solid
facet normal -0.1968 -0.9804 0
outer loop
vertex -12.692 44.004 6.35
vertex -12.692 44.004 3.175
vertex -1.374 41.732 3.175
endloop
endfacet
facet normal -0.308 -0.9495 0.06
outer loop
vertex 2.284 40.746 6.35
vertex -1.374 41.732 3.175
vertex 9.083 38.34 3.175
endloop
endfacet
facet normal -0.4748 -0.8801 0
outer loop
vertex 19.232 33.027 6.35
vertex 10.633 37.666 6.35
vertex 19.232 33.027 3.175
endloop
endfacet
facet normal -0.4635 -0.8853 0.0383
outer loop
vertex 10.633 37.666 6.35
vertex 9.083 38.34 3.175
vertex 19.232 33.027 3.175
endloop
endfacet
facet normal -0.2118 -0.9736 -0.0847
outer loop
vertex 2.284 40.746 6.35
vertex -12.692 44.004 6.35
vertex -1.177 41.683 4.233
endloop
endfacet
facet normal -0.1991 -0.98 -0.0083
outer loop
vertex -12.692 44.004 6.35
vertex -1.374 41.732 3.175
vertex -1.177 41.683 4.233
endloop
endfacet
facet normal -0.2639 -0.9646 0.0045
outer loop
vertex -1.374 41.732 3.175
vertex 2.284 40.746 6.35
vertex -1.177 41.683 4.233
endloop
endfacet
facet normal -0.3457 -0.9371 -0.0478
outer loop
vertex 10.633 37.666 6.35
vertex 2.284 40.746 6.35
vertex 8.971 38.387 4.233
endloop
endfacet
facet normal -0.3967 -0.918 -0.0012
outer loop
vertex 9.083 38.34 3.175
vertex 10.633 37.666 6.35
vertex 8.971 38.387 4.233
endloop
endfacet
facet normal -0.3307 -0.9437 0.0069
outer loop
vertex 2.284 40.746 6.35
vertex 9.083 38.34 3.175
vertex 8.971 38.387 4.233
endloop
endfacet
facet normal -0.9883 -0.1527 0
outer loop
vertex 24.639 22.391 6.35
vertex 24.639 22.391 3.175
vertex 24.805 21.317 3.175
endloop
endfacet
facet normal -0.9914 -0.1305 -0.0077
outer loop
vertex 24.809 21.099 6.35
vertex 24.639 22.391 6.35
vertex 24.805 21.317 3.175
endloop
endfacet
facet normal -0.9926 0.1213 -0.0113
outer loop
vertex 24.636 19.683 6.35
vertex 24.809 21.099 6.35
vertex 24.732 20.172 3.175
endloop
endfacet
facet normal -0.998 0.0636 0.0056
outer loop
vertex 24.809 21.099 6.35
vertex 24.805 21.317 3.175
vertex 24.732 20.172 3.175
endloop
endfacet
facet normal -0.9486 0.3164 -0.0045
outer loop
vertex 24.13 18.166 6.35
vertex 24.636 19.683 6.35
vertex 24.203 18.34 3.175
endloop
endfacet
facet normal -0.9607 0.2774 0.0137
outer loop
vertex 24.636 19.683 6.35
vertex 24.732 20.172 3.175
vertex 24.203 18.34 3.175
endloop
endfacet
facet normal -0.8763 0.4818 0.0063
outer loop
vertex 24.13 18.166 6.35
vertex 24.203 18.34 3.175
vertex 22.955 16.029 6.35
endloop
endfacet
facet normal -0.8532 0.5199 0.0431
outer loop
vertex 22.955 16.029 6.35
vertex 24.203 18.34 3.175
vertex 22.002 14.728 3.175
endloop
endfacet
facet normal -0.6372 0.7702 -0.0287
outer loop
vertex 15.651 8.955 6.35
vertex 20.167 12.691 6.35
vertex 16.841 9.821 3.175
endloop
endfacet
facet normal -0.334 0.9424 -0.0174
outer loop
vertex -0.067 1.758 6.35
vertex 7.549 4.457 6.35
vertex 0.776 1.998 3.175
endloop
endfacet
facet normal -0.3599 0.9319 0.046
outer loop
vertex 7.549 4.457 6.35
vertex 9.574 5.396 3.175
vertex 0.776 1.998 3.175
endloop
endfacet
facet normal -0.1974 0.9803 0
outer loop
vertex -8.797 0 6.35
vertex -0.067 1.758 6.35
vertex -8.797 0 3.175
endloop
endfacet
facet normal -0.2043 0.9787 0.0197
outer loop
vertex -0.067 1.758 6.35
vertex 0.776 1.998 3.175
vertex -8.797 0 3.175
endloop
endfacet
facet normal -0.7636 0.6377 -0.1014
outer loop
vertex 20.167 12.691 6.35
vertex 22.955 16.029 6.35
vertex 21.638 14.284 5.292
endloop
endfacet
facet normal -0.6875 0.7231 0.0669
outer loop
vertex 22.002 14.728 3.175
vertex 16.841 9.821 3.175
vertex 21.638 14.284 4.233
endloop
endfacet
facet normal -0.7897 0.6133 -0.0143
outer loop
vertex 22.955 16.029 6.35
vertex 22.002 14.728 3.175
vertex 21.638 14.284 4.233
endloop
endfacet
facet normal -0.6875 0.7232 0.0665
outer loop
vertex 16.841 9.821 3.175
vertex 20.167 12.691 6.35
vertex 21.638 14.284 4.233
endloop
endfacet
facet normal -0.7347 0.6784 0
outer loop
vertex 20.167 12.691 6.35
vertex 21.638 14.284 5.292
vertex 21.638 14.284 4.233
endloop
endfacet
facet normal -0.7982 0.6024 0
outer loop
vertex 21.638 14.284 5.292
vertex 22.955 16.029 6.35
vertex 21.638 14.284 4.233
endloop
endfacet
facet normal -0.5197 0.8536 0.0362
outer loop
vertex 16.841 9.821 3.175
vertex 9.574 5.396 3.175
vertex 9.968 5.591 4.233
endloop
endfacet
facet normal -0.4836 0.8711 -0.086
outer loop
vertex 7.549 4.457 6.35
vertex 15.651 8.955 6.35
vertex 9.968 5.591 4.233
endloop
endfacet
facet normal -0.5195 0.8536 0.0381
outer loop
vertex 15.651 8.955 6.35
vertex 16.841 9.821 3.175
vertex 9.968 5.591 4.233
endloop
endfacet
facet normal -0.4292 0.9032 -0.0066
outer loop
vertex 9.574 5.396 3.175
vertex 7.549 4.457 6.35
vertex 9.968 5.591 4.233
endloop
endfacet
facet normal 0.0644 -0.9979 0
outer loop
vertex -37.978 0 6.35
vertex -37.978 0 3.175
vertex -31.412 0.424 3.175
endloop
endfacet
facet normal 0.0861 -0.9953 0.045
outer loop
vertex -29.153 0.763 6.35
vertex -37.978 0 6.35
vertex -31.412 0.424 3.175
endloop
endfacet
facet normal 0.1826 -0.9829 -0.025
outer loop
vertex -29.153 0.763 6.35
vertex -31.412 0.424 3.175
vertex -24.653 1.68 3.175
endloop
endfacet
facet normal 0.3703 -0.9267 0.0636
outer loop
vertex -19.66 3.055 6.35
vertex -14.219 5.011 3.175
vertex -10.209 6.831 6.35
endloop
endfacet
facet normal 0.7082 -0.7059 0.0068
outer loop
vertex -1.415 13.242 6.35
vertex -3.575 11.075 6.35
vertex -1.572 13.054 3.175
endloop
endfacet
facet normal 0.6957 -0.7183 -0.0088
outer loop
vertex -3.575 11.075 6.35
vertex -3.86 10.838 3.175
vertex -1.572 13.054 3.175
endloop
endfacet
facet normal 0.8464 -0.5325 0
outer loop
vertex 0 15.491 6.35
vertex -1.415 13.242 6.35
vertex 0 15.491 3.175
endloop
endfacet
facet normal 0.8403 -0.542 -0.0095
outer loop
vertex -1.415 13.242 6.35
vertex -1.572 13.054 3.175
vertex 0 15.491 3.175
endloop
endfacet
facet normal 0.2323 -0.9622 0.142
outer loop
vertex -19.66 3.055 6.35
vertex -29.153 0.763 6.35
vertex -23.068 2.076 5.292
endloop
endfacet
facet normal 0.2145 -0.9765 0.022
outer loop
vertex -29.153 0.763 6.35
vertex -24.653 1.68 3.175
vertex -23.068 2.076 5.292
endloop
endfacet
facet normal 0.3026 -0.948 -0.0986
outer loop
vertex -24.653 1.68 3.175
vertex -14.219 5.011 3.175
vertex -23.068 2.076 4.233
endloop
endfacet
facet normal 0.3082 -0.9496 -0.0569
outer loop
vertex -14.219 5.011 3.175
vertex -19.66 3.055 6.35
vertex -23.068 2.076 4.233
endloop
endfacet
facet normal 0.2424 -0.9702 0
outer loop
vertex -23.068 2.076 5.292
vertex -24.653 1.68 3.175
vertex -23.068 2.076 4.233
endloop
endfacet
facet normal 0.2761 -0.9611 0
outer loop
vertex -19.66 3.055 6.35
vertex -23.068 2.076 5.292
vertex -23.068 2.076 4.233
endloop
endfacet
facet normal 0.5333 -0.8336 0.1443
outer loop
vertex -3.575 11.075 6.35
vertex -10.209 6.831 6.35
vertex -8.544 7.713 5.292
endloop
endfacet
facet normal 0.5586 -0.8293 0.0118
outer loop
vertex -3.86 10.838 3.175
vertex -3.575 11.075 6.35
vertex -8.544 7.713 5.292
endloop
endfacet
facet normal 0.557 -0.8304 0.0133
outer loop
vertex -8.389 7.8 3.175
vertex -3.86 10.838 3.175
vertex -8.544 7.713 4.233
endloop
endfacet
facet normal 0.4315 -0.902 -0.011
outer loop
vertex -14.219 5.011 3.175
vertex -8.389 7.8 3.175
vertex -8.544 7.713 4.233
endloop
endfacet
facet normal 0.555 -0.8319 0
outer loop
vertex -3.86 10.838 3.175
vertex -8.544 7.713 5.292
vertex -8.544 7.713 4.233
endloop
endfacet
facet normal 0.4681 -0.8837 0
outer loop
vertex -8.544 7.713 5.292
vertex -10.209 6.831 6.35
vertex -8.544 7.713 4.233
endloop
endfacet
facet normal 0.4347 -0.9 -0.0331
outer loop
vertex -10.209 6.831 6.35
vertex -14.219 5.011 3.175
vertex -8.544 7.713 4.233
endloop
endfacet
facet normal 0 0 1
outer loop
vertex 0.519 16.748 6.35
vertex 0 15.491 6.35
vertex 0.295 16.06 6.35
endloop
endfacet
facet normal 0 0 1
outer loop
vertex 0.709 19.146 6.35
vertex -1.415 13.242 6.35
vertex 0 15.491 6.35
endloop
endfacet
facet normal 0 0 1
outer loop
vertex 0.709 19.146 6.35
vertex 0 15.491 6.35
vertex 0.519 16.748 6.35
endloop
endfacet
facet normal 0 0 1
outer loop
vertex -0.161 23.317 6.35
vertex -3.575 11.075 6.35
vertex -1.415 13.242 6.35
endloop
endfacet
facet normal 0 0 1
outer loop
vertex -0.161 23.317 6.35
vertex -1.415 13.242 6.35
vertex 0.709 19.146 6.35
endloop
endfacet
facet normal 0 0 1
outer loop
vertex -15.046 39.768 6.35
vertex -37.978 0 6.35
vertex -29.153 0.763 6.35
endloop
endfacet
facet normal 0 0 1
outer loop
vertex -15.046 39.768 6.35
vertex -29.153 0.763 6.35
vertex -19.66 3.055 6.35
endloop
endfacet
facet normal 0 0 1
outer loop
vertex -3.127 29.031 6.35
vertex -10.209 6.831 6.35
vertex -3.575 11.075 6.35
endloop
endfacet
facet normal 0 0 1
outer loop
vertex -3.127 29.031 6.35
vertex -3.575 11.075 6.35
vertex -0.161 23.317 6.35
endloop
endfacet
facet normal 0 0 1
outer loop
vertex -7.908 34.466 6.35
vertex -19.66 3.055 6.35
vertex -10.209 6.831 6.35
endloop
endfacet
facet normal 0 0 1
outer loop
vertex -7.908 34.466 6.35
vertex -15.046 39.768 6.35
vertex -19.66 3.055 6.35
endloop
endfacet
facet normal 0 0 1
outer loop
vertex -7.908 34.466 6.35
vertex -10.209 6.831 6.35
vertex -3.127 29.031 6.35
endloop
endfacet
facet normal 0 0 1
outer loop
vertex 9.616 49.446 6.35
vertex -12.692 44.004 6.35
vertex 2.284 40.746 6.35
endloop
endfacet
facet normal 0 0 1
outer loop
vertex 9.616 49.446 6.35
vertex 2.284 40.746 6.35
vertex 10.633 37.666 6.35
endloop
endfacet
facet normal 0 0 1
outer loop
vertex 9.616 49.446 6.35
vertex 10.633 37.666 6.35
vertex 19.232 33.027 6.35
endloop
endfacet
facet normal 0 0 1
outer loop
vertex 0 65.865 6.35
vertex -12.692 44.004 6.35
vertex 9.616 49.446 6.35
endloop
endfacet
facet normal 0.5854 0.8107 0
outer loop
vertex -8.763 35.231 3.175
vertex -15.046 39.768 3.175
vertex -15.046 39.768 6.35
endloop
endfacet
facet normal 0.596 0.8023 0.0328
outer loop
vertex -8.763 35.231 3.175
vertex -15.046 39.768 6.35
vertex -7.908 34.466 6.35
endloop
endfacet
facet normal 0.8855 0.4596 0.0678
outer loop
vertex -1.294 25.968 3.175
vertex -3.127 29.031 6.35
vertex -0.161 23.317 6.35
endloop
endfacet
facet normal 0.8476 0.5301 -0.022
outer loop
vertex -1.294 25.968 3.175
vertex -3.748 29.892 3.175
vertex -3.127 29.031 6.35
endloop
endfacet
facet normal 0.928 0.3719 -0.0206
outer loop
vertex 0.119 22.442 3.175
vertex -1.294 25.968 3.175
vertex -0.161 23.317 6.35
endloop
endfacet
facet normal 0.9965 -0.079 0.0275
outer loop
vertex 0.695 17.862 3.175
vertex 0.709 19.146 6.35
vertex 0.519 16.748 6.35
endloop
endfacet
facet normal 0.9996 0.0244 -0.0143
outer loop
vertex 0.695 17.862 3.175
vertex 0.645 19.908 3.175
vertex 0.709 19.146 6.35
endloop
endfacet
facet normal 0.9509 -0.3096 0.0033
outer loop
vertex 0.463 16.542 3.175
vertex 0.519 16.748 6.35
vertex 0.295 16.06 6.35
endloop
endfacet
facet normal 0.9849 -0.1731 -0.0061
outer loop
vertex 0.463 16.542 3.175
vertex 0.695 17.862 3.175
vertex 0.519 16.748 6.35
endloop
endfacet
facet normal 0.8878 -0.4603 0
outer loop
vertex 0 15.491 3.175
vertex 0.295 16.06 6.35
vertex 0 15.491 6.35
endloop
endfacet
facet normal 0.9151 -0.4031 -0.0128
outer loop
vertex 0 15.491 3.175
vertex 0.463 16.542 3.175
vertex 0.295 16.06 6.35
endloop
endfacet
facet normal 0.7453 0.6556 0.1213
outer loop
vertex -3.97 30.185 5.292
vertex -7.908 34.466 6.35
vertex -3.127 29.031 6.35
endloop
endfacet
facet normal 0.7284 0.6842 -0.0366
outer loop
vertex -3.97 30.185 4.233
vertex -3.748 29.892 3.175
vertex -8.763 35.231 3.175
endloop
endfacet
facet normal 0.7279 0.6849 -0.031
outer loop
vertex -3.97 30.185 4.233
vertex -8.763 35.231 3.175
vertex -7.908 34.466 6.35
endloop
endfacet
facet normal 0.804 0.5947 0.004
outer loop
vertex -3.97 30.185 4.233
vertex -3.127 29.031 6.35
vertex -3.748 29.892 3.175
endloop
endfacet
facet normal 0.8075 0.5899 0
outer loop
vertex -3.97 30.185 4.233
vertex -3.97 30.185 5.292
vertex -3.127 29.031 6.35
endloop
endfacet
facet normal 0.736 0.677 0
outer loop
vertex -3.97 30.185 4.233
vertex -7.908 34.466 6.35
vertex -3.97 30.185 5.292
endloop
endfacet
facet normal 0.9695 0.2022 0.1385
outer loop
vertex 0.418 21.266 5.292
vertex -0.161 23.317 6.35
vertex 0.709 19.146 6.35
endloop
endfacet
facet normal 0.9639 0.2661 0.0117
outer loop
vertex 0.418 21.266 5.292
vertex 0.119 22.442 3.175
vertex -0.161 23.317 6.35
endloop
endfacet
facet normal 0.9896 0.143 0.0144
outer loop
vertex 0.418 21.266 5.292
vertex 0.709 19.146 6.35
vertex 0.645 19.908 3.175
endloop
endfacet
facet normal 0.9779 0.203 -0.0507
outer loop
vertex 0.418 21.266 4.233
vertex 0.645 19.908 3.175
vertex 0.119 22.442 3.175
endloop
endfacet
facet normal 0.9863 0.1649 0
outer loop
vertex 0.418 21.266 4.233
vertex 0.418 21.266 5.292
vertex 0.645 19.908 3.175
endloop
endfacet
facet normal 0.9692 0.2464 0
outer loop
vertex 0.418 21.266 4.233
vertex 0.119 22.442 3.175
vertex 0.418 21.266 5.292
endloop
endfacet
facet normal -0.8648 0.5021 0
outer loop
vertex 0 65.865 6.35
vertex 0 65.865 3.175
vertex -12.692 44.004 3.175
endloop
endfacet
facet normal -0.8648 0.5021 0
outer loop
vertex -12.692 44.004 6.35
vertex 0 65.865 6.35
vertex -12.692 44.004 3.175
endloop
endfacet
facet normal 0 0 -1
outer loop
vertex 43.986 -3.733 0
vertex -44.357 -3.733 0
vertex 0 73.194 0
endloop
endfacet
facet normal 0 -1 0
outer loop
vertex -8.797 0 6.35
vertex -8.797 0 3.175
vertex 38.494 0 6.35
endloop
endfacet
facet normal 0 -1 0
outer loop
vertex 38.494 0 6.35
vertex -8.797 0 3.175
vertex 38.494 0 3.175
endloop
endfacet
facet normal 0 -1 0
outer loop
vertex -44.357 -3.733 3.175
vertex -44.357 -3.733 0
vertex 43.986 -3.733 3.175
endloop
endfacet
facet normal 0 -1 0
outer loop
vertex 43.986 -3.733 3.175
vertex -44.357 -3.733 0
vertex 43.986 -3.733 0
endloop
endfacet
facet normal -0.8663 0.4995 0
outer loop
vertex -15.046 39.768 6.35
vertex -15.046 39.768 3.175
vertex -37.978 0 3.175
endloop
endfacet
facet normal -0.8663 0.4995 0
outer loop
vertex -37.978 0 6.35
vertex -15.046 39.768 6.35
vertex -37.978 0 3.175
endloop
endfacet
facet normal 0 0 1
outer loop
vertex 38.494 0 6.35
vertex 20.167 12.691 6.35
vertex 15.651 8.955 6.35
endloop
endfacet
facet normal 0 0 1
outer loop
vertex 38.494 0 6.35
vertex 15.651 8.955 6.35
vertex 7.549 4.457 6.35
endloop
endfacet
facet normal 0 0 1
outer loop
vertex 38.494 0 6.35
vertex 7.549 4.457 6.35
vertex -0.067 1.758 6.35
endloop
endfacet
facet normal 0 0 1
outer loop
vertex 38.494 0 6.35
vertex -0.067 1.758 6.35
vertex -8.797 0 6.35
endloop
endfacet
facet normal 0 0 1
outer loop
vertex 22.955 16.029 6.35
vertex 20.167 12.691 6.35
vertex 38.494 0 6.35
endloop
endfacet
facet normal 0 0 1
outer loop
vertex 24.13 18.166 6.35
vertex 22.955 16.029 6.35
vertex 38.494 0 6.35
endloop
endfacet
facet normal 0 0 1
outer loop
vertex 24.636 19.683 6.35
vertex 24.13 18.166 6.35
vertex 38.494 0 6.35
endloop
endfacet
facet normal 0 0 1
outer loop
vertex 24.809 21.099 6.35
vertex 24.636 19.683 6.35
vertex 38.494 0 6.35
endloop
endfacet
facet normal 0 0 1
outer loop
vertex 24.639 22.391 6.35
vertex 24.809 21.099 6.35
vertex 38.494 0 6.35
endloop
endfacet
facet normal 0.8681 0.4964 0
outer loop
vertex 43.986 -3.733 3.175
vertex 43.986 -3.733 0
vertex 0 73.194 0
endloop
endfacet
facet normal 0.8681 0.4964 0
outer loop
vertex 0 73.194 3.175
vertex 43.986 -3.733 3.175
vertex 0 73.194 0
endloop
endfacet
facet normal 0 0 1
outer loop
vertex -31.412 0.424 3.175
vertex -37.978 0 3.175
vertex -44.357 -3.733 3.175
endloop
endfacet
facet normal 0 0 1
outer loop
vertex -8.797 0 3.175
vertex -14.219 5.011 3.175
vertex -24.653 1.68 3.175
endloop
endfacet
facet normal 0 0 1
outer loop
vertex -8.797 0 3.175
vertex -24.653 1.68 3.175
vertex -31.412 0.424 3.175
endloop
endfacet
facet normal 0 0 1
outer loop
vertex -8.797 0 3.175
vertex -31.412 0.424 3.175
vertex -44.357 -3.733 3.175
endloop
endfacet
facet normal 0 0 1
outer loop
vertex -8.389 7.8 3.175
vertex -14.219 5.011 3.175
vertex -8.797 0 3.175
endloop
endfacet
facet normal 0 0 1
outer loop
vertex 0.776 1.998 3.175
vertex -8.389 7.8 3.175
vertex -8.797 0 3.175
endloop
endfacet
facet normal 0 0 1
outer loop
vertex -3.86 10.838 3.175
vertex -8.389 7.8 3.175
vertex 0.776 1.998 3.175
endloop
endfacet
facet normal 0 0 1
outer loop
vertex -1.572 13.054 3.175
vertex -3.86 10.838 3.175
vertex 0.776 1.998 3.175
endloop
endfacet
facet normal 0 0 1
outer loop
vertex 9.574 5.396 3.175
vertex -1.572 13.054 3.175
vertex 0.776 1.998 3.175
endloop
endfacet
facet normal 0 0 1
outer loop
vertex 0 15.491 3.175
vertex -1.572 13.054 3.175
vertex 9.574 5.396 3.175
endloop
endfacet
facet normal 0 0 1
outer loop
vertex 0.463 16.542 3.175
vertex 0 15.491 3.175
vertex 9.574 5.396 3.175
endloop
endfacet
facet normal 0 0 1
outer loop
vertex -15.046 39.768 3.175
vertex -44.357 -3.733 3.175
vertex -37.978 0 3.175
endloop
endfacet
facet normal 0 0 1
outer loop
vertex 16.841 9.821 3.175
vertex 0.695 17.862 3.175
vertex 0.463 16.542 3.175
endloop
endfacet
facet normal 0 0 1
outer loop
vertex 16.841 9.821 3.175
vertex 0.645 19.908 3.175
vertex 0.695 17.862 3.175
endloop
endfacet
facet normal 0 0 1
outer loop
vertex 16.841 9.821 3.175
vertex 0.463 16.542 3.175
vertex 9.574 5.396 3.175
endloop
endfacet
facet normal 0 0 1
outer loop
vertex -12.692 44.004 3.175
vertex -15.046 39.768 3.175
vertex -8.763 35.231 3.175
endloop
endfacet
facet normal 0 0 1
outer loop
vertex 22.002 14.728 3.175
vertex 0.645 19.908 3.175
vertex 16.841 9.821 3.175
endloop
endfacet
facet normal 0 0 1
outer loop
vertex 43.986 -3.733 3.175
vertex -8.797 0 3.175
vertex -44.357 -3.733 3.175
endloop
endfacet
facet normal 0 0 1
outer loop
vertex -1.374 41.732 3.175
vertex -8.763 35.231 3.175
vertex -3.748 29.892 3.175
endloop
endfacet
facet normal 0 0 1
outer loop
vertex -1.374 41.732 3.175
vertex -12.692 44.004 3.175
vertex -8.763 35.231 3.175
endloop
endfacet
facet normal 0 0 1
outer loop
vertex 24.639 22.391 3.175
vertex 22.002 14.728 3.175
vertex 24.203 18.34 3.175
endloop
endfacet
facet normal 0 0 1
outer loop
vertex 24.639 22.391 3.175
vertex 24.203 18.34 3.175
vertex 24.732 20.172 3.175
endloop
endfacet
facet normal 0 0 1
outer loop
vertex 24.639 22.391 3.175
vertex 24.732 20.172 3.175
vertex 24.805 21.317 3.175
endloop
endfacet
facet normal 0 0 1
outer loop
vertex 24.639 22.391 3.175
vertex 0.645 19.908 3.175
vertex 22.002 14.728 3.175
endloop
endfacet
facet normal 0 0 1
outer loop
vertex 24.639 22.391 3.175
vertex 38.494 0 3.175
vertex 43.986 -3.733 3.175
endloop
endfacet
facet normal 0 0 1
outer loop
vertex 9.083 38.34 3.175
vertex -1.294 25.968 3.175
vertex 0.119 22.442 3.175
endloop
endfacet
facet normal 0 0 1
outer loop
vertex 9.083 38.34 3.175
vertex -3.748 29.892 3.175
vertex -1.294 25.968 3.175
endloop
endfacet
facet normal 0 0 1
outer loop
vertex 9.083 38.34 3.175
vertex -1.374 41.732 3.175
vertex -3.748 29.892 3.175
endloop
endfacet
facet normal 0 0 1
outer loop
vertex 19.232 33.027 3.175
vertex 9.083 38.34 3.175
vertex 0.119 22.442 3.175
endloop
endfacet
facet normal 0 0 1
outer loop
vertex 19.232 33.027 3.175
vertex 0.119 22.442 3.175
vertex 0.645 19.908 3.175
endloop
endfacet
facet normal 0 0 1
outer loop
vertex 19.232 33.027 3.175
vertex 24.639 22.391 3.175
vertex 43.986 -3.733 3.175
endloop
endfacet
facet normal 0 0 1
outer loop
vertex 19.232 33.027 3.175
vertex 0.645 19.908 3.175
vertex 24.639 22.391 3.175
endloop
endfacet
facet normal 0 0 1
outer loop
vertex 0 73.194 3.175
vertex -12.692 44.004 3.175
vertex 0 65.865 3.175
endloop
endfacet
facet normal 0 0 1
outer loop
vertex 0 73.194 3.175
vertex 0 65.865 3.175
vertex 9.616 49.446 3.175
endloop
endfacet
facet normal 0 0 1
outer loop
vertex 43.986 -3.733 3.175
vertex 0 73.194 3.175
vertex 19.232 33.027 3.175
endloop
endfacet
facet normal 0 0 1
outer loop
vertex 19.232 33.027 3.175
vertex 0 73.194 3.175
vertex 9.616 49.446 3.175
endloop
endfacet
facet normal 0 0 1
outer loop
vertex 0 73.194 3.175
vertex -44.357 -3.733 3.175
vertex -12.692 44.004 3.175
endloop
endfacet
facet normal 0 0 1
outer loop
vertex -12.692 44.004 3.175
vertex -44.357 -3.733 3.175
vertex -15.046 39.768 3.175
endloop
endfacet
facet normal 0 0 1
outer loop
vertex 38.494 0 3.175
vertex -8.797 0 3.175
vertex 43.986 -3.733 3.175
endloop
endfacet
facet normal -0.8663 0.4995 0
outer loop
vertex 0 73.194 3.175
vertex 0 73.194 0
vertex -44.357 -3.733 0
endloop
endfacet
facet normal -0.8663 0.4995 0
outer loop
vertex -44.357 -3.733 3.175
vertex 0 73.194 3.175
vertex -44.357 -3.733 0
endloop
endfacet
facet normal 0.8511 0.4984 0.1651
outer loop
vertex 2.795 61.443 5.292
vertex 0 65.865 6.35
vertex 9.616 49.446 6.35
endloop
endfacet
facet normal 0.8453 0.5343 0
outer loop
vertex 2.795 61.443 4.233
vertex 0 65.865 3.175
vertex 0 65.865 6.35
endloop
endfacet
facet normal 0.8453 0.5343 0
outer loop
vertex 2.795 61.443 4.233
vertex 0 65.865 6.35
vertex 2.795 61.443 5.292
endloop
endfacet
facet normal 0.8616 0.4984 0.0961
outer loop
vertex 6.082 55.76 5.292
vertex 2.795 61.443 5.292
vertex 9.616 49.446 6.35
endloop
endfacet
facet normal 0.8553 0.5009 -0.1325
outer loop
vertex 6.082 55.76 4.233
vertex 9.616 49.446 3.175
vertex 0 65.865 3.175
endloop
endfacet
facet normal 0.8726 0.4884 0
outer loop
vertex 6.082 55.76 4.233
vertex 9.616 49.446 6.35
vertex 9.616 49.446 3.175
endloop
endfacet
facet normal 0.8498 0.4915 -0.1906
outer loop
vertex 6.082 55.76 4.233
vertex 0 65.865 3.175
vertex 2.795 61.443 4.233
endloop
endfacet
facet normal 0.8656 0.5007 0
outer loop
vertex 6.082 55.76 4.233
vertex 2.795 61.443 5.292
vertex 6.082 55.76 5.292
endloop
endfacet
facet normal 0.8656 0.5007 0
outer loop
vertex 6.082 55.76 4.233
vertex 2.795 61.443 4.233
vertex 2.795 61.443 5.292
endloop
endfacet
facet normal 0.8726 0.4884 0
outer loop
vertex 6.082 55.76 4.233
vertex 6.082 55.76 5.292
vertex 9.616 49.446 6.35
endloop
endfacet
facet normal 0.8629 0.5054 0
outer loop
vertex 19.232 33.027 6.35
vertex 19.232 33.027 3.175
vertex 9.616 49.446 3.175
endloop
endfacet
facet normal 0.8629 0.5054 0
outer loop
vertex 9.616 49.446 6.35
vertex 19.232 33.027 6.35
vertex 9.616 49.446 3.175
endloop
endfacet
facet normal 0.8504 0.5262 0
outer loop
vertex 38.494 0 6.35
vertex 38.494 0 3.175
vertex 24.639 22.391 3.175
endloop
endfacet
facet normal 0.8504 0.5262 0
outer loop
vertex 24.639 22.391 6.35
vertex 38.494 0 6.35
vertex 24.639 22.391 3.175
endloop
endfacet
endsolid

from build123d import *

# Parameters (mm, degrees)
F4_DEPTH = 6.35
F5_DEPTH = 3.175
F6_DEPTH = 6.35
F7_DEPTH = 6.35


with BuildPart() as f4:
    # F0 (on Top) → F4 (new body)
    with BuildSketch(Plane.XY):
        with BuildLine():
            Line((0, 65.86501), (-12.691889, 44.004165))
            add(Edge.make_bspline(
                [(-12.691889, 44.004165), (0, 41.807882), (8.420921, 39.781306), (19.231755, 33.027414)],
                knots=[0, 0, 0, 0, 33.758082, 33.758082, 33.758082, 33.758082], degree=3))
            add(Edge.make_bspline(
                [(9.615878, 49.446212), (13.190391, 43.027269), (16.764905, 36.608325), (19.231755, 33.027414)],
                knots=[19.027402, 19.027402, 19.027402, 19.027402, 38.054804, 38.054804, 38.054804, 38.054804], degree=3))
            Line((9.615878, 49.446212), (0, 65.86501))
        make_face()
        with BuildLine():
            add(Edge.make_bspline(
                [(0, 65.86501), (2.46685, 62.284099), (6.041364, 55.865156), (9.615878, 49.446212)],
                knots=[0, 0, 0, 0, 19.027402, 19.027402, 19.027402, 19.027402], degree=3))
            Line((0, 65.86501), (9.615878, 49.446212))
        make_face()
        with BuildLine():
            add(Edge.make_bspline(
                [(9.615878, 49.446212), (13.190391, 43.027269), (16.764905, 36.608325), (19.231755, 33.027414)],
                knots=[19.027402, 19.027402, 19.027402, 19.027402, 38.054804, 38.054804, 38.054804, 38.054804], degree=3))
            Line((19.231755, 33.027414), (9.615878, 49.446212))
        make_face()
    extrude(amount=F4_DEPTH)

    # F3 (on Top) → F5 (join)
    with BuildSketch(Plane.XY):
        Polygon((43.985669, -3.733072), (0, 73.194362), (-44.357441, -3.733072), align=None)
    extrude(amount=F5_DEPTH)

    # F2 (on Top) → F6 (join)
    with BuildSketch(Plane.XY):
        with BuildLine():
            Line((38.493596, 0), (24.638867, 22.391399))
            add(Edge.make_bspline(
                [(24.638867, 22.391399), (26.498249, 15.807372), (12.989721, 2.810146), (-8.79713, 0)],
                knots=[0, 0, 0, 0, 40.241032, 40.241032, 40.241032, 40.241032], degree=3))
            Line((-8.79713, 0), (38.493596, 0))
        make_face()
    extrude(amount=F6_DEPTH)

    # F1 (on Top) → F7 (join)
    with BuildSketch(Plane.XY):
        with BuildLine():
            Line((-15.045927, 39.76772), (-37.978165, 0))
            add(Edge.make_bspline(
                [(-37.978165, 0), (-24.740312, -0.17884), (-3.689409, 7.116403), (0, 15.49142)],
                knots=[0, 0, 0, 0, 41.016157, 41.016157, 41.016157, 41.016157], degree=3))
            add(Edge.make_bspline(
                [(-15.045927, 39.76772), (0, 30.680645), (2.194603, 18.867477), (0, 15.49142)],
                knots=[0, 0, 0, 0, 28.560788, 28.560788, 28.560788, 28.560788], degree=3))
        make_face()
    extrude(amount=F7_DEPTH)


solid = f4.part
